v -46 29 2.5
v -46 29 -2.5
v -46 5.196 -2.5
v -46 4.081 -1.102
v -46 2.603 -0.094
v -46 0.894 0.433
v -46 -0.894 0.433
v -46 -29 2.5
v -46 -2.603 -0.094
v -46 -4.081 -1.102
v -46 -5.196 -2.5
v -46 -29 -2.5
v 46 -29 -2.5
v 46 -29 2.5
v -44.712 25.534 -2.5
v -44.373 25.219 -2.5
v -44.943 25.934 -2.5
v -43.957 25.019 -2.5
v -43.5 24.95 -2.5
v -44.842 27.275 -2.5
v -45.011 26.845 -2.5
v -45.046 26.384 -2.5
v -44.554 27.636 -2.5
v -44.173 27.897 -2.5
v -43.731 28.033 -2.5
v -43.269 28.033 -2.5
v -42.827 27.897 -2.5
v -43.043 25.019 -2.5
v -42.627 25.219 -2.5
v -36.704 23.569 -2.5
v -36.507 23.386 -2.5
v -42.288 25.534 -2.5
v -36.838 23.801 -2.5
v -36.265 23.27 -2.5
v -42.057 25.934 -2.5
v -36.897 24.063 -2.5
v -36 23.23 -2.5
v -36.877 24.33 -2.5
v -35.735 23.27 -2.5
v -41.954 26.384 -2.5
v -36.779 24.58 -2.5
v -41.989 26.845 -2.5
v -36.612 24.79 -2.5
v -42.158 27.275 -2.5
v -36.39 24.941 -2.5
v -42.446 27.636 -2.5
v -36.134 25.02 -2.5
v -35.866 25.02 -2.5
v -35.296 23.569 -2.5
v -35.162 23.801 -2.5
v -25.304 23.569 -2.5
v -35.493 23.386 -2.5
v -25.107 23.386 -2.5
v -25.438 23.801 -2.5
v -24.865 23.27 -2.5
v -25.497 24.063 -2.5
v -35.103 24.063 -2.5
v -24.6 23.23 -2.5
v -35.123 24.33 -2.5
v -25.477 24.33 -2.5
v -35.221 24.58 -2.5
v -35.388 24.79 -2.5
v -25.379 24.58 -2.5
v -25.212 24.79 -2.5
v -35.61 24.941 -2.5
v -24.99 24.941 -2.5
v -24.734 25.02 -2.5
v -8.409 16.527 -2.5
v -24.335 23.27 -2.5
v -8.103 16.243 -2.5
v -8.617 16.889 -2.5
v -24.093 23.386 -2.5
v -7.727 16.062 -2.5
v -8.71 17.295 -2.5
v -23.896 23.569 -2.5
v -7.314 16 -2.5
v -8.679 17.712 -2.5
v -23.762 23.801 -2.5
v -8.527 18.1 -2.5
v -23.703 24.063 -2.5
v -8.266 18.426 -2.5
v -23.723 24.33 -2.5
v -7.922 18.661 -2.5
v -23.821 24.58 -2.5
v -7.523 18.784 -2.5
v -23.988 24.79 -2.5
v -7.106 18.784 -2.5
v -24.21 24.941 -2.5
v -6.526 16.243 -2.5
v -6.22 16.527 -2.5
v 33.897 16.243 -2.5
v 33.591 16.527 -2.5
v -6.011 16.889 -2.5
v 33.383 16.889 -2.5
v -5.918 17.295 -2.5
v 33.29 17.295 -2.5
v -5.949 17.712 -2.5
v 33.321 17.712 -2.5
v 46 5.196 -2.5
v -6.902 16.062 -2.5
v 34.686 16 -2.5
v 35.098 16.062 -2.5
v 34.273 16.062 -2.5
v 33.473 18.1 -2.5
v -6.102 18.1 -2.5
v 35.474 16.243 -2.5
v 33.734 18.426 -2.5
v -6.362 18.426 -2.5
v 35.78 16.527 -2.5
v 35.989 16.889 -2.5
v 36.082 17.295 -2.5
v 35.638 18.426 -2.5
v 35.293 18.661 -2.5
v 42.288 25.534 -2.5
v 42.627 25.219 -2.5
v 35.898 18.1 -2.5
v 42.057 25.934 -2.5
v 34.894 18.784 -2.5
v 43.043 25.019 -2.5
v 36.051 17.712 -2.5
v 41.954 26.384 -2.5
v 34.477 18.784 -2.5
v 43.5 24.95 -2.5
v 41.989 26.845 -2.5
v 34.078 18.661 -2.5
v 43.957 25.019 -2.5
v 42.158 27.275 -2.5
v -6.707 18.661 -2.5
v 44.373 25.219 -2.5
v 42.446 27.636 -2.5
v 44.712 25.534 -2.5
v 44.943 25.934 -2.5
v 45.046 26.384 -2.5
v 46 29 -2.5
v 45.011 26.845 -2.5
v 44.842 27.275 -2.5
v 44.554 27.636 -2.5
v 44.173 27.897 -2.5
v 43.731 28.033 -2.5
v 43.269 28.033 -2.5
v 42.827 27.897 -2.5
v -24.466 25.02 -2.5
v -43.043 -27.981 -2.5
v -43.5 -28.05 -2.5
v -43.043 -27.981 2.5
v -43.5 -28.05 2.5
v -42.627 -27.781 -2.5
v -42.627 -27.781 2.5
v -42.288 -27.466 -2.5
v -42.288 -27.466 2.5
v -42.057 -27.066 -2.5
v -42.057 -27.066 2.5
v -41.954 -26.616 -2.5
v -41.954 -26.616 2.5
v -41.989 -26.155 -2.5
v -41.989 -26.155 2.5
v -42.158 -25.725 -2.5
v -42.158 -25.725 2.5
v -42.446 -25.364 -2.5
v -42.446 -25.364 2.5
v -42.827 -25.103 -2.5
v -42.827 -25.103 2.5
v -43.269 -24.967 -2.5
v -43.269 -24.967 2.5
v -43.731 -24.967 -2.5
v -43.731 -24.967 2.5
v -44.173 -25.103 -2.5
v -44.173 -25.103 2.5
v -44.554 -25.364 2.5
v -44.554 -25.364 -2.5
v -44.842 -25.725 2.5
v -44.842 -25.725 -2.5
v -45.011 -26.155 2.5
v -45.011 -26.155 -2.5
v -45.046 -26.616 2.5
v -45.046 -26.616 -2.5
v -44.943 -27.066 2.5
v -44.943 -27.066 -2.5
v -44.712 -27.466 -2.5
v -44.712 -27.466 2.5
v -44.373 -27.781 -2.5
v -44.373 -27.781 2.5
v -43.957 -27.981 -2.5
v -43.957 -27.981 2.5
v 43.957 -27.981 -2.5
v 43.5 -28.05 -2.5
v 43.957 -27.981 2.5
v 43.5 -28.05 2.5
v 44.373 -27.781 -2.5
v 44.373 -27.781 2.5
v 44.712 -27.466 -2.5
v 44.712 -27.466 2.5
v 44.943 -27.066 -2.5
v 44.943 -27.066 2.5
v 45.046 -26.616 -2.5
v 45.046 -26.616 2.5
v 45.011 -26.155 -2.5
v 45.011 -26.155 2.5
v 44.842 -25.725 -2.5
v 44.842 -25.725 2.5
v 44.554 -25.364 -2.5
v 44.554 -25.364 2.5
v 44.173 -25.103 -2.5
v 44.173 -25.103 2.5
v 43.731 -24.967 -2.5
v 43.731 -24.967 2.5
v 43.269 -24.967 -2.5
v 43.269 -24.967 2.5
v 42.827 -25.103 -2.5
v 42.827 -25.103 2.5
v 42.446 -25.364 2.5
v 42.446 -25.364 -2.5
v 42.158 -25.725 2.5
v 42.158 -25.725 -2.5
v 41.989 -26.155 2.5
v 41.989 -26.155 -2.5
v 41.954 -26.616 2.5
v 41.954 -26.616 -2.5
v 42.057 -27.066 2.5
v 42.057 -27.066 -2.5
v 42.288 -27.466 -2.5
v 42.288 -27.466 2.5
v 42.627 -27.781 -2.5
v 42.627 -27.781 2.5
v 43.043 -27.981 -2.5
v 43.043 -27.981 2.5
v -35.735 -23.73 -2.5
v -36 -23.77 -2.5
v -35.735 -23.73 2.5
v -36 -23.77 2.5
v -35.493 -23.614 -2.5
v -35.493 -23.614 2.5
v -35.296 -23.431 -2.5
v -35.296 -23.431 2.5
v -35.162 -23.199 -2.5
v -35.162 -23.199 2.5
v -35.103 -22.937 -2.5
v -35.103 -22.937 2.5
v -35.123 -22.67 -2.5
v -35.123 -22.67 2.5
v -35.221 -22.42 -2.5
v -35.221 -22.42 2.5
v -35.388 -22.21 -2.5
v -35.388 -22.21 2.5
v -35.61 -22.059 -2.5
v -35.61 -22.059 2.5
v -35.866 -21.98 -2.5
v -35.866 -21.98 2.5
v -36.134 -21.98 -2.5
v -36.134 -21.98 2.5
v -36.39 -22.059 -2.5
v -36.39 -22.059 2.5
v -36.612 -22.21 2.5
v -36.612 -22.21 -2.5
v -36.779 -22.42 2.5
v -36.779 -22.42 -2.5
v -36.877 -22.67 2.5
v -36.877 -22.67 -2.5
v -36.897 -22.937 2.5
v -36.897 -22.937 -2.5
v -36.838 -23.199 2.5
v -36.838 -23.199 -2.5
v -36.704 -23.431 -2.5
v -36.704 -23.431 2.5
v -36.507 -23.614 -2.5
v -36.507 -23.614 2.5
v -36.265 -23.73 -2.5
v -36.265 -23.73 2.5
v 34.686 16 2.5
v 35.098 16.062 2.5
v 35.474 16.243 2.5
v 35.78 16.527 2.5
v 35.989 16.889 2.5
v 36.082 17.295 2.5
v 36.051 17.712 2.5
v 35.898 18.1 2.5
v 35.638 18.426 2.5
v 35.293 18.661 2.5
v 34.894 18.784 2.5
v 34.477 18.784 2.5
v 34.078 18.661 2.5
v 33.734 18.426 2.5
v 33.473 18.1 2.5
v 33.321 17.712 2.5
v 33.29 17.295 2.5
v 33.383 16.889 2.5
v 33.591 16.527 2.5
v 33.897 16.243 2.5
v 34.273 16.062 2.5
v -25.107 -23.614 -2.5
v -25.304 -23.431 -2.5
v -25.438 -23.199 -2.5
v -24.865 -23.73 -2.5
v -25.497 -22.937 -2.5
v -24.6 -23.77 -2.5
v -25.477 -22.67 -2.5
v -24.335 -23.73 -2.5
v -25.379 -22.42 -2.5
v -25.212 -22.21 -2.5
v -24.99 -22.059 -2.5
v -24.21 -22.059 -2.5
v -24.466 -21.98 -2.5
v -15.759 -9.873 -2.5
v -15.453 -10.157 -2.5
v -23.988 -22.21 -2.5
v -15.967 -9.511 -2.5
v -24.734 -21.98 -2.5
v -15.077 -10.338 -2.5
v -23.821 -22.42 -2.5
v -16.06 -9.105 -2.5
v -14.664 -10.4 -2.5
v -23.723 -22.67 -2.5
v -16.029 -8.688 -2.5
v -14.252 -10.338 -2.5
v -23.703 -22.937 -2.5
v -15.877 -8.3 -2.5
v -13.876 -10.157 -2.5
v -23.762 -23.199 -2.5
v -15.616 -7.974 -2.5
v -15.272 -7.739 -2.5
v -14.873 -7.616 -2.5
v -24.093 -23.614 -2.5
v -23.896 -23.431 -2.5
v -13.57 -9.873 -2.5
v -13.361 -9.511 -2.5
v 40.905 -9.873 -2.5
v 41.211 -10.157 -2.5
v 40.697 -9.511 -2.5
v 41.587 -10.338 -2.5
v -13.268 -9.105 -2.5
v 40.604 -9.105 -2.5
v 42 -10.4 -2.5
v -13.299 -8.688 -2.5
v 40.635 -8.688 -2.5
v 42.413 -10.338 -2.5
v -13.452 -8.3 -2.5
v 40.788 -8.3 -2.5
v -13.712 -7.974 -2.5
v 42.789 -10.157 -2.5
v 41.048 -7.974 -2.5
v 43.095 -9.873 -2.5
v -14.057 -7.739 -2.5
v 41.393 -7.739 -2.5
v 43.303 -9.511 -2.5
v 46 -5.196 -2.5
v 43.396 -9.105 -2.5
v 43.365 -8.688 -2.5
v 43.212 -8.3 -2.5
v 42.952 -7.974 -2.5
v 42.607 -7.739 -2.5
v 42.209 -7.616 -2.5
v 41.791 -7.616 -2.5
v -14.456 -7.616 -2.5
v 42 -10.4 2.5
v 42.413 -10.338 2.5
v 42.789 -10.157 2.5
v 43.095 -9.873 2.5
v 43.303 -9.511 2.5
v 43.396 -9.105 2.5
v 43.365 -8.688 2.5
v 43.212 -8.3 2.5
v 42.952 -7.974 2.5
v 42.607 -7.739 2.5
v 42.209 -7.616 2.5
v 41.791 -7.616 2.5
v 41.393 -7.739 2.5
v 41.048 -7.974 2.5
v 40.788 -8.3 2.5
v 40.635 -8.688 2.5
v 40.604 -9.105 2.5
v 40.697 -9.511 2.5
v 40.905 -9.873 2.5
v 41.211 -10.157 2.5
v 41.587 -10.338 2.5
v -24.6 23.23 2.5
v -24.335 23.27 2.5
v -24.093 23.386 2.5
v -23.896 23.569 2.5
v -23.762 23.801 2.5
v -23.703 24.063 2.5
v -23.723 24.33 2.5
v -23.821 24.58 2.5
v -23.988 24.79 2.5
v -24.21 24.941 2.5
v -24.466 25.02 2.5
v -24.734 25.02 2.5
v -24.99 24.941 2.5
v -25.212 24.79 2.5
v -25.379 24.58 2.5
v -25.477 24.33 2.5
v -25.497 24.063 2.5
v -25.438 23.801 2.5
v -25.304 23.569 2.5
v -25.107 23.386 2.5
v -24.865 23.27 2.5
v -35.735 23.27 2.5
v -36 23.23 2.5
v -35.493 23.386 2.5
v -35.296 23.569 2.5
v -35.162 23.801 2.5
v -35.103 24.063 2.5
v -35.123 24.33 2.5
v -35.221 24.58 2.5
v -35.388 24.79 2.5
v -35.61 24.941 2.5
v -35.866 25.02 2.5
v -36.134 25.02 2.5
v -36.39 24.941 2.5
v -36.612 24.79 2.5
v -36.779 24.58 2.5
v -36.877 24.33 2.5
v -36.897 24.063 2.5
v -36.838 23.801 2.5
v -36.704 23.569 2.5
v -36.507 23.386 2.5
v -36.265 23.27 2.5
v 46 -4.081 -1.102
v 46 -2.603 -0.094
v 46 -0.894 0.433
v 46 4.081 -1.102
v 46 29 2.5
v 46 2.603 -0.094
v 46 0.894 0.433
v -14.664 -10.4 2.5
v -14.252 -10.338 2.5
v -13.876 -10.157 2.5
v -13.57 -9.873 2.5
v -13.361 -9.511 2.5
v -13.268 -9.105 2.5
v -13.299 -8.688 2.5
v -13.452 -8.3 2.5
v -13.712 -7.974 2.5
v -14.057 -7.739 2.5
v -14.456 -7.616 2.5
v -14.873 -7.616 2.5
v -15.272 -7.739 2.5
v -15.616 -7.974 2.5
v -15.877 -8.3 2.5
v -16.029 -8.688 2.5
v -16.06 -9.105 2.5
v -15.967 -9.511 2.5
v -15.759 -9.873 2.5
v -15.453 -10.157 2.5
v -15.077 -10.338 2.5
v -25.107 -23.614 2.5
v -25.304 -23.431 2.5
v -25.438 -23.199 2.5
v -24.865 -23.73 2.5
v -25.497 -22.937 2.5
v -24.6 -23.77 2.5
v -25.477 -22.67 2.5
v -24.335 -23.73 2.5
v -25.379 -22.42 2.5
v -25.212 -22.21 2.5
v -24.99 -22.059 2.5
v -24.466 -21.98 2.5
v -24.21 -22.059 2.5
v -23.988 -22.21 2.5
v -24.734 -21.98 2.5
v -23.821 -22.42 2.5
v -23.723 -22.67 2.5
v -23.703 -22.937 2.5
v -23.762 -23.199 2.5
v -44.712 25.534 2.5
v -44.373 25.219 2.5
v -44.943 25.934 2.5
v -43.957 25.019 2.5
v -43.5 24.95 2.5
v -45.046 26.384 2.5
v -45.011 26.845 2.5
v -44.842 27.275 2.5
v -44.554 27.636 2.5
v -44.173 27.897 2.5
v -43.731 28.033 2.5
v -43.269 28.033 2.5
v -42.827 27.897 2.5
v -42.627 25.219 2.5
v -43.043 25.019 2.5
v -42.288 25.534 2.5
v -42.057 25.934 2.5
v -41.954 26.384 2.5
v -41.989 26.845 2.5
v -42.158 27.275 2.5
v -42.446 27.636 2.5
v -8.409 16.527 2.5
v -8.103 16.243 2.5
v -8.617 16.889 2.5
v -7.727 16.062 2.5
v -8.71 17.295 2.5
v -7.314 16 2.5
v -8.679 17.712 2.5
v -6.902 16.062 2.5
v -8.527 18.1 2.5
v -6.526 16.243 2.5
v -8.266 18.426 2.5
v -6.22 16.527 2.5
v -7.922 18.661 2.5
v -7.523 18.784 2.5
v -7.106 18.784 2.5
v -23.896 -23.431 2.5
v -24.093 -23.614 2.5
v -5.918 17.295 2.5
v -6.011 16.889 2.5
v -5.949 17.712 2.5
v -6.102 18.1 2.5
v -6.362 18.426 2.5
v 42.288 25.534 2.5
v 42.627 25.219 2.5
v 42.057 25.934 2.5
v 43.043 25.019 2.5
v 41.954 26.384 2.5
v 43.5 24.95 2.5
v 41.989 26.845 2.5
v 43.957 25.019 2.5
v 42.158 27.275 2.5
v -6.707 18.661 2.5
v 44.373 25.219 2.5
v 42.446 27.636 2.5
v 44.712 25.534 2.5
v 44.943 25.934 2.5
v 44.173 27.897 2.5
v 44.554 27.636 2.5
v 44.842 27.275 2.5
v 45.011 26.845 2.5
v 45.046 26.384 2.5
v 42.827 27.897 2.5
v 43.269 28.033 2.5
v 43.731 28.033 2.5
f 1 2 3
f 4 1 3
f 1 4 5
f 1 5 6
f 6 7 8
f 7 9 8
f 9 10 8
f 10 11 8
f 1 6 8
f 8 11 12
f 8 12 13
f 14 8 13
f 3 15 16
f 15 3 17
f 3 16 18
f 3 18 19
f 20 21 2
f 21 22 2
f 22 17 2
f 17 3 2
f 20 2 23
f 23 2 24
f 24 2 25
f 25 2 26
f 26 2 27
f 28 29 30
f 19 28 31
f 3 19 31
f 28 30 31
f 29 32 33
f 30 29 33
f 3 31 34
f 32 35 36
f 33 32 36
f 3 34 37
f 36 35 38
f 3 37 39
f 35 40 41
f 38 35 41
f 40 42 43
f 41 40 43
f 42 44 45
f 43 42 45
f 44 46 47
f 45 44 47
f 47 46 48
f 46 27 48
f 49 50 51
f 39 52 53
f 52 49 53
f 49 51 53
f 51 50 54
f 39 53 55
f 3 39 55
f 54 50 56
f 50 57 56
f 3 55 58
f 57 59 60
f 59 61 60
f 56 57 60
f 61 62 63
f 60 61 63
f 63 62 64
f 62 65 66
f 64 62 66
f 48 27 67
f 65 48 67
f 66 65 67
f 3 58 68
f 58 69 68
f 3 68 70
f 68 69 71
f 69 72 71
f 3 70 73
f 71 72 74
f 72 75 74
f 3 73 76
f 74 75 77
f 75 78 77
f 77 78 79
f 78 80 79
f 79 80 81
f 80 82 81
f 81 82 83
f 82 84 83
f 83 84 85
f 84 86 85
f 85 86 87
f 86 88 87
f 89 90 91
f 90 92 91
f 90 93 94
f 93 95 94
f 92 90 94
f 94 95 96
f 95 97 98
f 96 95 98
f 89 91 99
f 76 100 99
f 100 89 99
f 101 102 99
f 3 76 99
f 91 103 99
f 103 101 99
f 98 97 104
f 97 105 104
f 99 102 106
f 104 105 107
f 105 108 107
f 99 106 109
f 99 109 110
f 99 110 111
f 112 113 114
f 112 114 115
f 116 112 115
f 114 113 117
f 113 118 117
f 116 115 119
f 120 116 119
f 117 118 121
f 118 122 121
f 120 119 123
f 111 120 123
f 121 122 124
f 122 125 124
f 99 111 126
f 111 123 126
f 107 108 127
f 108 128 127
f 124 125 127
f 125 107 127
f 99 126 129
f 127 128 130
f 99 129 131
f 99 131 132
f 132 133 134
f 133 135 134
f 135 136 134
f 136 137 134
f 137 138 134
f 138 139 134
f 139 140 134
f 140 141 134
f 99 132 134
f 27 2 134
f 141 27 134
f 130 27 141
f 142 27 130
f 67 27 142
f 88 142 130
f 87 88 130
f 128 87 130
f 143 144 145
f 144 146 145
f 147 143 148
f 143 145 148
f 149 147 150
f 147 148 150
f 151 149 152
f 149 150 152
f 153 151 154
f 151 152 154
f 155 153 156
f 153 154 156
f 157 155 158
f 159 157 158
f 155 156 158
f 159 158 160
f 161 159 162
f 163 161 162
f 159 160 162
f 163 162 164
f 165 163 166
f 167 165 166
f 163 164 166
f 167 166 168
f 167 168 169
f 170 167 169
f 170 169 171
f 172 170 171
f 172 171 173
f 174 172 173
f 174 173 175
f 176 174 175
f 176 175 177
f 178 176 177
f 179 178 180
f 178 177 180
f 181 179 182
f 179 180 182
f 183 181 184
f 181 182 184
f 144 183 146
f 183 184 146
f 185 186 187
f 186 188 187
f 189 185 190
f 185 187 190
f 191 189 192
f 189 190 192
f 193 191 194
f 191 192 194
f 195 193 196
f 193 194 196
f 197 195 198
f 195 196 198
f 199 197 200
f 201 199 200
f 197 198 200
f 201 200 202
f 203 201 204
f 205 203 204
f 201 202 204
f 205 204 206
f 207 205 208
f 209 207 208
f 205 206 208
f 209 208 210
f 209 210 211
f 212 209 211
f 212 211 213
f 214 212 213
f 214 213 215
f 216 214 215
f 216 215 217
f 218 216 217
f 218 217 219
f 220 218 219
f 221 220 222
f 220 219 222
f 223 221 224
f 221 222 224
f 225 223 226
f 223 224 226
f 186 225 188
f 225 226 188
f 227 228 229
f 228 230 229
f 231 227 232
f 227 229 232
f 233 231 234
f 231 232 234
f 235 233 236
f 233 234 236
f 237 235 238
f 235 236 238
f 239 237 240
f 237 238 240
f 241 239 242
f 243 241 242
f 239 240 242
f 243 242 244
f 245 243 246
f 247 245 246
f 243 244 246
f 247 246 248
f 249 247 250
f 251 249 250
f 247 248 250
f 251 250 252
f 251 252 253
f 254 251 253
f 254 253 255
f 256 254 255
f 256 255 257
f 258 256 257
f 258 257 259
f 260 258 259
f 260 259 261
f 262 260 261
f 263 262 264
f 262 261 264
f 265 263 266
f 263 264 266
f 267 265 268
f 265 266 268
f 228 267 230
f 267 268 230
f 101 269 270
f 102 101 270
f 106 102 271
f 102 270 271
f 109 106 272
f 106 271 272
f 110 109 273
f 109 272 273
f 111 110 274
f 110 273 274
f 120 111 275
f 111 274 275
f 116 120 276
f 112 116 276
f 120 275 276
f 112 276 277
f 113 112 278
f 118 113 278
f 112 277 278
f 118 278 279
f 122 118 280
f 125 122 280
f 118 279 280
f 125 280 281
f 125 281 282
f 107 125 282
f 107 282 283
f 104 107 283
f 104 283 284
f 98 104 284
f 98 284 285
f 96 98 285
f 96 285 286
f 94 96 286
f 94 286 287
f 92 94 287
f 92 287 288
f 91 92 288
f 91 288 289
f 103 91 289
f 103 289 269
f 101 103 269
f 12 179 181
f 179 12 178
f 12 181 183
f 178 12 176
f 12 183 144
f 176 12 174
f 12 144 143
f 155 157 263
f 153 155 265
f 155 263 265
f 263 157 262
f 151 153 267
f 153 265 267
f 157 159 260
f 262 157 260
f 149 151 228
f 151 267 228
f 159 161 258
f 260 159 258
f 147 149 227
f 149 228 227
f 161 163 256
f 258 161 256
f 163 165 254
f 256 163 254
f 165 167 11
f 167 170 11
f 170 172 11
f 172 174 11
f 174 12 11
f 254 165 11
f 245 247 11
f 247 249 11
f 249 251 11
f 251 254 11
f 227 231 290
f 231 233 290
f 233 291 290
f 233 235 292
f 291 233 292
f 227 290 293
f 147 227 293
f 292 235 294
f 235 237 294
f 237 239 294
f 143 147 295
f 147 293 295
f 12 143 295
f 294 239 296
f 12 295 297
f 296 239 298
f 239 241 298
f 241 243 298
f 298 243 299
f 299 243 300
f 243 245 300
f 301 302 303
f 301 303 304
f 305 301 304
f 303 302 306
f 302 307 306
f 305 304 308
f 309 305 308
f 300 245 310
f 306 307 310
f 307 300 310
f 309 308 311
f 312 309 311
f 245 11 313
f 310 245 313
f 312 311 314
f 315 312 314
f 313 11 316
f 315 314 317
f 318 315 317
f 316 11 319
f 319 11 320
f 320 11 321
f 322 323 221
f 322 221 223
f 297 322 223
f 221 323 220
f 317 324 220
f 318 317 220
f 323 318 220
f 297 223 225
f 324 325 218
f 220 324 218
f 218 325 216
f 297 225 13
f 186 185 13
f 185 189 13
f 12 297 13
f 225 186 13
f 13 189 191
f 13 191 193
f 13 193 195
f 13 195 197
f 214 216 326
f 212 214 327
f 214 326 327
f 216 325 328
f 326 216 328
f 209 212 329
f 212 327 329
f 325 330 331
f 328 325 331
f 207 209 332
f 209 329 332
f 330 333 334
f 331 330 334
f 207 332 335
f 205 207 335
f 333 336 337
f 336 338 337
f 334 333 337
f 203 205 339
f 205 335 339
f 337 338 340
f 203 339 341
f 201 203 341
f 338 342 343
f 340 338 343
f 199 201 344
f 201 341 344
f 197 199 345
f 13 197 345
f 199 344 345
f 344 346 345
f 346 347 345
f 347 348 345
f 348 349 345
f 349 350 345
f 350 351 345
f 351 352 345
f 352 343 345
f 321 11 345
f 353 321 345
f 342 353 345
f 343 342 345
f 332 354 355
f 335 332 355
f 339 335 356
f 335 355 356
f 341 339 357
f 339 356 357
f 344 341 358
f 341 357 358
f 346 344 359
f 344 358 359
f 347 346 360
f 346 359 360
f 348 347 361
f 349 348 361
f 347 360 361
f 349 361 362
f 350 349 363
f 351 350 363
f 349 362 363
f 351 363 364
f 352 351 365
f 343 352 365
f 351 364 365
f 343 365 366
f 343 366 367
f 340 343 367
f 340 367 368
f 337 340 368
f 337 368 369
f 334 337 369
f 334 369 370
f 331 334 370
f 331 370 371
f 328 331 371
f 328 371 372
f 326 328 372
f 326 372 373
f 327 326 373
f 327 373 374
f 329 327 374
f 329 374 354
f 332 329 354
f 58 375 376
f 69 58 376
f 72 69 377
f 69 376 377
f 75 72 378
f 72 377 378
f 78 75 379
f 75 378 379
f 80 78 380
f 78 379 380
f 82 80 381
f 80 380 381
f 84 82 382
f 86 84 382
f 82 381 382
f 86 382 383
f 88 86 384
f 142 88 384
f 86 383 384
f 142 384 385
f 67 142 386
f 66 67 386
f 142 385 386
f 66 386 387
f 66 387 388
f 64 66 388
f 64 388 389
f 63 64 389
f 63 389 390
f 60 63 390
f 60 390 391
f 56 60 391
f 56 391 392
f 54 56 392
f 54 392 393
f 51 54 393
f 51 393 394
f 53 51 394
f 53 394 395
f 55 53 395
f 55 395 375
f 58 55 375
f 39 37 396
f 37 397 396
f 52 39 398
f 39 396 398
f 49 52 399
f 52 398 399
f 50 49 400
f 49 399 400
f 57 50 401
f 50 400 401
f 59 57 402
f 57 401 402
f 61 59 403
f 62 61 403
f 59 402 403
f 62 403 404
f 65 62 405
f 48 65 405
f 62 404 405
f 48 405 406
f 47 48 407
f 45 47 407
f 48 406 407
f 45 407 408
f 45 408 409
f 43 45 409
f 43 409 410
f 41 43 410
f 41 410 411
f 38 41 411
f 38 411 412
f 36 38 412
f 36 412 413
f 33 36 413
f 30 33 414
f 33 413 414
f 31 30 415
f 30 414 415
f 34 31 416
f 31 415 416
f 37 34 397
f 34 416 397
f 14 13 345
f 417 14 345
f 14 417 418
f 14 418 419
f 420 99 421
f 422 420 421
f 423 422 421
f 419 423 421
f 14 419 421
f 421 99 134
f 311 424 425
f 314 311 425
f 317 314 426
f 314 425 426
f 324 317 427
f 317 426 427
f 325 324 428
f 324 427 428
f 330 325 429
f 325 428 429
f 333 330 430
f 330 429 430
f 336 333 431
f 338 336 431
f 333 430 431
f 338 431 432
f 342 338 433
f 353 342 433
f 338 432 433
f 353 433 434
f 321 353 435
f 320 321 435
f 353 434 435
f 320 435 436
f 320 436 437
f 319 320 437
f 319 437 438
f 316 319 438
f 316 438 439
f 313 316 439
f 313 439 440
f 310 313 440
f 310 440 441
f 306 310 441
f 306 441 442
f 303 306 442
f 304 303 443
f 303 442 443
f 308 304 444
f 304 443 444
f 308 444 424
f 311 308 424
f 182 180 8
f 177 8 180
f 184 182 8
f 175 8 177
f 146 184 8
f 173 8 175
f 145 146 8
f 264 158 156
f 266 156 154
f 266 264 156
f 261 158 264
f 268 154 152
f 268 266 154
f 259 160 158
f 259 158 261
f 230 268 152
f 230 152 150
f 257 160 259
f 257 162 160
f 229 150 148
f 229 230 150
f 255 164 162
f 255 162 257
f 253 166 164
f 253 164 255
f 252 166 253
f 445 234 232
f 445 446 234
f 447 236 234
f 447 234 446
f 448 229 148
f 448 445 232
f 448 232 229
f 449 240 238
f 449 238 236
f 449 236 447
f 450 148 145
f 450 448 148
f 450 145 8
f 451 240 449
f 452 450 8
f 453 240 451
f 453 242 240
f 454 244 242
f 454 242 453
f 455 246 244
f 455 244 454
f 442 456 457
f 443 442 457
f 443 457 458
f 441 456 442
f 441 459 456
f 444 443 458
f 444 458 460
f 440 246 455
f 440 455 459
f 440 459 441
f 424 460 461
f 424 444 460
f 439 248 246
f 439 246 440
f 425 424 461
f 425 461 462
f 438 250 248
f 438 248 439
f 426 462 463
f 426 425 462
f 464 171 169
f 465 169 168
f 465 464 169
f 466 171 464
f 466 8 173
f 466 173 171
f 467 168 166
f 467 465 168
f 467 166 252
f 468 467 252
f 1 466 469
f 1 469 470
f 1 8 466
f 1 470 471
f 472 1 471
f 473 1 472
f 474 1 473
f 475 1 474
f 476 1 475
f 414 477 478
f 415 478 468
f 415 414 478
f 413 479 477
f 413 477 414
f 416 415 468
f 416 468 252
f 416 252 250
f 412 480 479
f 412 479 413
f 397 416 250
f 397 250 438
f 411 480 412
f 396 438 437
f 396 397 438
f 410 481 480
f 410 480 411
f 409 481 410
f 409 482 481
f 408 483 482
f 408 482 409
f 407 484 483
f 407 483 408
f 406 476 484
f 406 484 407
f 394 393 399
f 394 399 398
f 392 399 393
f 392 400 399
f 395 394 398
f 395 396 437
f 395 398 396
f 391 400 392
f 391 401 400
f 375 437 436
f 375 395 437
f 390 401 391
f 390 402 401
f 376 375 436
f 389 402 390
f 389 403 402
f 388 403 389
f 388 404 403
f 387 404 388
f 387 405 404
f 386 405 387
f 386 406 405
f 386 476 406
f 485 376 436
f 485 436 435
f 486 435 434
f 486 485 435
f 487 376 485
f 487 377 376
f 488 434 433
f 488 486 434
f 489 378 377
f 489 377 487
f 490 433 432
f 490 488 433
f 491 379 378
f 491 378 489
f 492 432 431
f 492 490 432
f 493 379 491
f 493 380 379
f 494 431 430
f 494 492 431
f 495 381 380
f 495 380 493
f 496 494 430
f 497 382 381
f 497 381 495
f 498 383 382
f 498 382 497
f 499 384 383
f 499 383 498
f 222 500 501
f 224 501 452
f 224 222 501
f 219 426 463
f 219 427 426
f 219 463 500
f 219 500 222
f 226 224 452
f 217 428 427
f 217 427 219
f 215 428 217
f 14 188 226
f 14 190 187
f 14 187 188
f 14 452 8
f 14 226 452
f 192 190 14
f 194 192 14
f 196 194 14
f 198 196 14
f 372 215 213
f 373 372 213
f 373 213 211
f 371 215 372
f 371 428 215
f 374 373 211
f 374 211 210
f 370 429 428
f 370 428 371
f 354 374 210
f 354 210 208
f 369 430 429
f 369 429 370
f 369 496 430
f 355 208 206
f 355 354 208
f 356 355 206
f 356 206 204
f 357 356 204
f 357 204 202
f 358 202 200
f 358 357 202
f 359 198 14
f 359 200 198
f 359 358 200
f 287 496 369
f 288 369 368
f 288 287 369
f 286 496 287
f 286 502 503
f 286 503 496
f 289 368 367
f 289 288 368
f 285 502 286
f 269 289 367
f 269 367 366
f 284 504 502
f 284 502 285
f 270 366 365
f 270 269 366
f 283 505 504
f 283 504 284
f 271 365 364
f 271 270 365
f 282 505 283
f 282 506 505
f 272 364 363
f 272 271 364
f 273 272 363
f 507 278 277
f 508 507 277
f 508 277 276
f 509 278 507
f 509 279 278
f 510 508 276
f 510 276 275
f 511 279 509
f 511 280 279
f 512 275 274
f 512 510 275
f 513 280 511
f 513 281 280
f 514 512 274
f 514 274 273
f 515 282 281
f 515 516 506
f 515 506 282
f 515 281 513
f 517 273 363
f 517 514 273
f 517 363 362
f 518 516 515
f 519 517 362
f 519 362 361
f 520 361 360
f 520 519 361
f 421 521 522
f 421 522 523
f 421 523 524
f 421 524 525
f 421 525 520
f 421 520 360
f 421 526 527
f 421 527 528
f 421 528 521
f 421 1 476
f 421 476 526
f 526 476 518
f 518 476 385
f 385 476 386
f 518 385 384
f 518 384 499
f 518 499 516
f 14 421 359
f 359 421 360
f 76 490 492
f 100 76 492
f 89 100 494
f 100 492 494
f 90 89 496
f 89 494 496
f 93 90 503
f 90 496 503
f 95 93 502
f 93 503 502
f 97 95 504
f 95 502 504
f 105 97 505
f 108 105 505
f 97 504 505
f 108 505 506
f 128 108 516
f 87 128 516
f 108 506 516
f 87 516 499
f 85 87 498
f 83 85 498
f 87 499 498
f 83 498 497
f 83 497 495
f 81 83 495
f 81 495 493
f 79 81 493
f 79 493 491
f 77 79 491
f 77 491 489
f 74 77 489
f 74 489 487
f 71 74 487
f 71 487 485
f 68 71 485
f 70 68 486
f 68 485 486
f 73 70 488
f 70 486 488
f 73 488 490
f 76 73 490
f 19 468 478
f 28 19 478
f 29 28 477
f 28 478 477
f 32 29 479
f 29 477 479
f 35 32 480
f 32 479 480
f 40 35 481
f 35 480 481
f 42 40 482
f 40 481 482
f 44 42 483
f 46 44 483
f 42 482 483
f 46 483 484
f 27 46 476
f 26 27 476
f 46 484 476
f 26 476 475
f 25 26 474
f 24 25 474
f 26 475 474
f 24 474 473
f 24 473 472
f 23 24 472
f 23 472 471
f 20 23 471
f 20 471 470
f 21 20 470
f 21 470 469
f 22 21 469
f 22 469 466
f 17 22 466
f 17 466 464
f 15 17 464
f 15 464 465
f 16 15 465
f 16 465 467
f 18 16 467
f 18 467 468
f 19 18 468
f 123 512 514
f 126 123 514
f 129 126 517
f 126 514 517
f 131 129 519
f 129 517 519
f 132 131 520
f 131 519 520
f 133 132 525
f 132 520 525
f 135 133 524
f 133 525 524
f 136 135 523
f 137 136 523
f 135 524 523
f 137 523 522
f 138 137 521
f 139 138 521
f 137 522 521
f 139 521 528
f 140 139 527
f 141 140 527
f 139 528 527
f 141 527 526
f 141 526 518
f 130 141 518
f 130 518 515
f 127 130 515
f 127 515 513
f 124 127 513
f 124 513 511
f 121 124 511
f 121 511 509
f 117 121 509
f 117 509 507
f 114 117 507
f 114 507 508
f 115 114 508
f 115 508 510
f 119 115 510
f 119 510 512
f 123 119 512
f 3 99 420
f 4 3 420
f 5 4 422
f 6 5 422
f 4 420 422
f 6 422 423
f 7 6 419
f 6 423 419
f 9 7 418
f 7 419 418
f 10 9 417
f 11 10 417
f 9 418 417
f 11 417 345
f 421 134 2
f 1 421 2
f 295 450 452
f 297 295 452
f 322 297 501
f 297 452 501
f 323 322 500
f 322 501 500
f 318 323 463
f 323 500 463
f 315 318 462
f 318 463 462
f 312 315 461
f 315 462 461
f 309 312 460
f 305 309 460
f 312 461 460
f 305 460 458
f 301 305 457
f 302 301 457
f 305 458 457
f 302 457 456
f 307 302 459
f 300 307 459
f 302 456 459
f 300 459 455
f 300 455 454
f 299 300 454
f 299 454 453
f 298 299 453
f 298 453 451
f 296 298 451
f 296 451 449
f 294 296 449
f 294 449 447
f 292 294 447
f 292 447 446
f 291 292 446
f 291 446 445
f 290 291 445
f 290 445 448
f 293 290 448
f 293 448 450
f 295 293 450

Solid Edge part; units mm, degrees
sketch "Sketch1" plane through (0, 0, 0) normal (0, 0, 1) x (1, 0, 0)
  line L0 (-46, -29) -> (46, -29)
  line L1 (46, -29) -> (46, 29)
  line L2 (46, 29) -> (-46, 29)
  line L3 (-46, 29) -> (-46, -29)
  dimension "D1" = 92
  dimension "D2" = 58
extrude "Ajout_matière_1" add sketch "Sketch1" along normal mid plane 5
sketch "Sketch2" plane through (46, 0, 0) normal (1, 0, 0) x (0, 1, 0)
  circle A0 centre (0, -5.5) radius 6
  dimension "D1" = 12
  dimension "D2" = 3
extrude "Cutout1" cut sketch "Sketch2" against normal through all
hole "Perçage_1" at (-43.5, 26.5, 2.5) direction (0, 0, -1) diameter 3.1 end up to next
hole "Hole1" at (43.5, 26.5, 2.5) direction (0, 0, -1) diameter 3.1 end up to next
hole "Hole2" at (43.5, -26.5, 2.5) direction (0, 0, -1) diameter 3.1 end up to next
hole "Hole3" at (-43.5, -26.5, 2.5) direction (0, 0, -1) diameter 3.1 end up to next
hole "Hole4" at (-36, -22.87, 2.5) direction (0, 0, -1) diameter 1.8 end up to next
hole "Hole5" at (-36, 24.13, 2.5) direction (0, 0, -1) diameter 1.8 end up to next
hole "Hole6" at (-24.6, 24.13, 2.5) direction (0, 0, -1) diameter 1.8 end up to next
hole "Hole7" at (-24.6, -22.87, 2.5) direction (0, 0, -1) diameter 1.8 end up to next
hole "Perçage_13" at (-14.6642, -9, 2.5) direction (0, 0, -1) diameter 2.8 end up to next
hole "Hole8" at (34.6858, 17.4, 2.5) direction (0, 0, -1) diameter 2.8 end up to next
hole "Hole9" at (-7.3142, 17.4, 2.5) direction (0, 0, -1) diameter 2.8 end up to next
hole "Hole10" at (42, -9, 2.5) direction (0, 0, -1) diameter 2.8 end up to next
properties material "Plastique ABS, performance moyenne"
